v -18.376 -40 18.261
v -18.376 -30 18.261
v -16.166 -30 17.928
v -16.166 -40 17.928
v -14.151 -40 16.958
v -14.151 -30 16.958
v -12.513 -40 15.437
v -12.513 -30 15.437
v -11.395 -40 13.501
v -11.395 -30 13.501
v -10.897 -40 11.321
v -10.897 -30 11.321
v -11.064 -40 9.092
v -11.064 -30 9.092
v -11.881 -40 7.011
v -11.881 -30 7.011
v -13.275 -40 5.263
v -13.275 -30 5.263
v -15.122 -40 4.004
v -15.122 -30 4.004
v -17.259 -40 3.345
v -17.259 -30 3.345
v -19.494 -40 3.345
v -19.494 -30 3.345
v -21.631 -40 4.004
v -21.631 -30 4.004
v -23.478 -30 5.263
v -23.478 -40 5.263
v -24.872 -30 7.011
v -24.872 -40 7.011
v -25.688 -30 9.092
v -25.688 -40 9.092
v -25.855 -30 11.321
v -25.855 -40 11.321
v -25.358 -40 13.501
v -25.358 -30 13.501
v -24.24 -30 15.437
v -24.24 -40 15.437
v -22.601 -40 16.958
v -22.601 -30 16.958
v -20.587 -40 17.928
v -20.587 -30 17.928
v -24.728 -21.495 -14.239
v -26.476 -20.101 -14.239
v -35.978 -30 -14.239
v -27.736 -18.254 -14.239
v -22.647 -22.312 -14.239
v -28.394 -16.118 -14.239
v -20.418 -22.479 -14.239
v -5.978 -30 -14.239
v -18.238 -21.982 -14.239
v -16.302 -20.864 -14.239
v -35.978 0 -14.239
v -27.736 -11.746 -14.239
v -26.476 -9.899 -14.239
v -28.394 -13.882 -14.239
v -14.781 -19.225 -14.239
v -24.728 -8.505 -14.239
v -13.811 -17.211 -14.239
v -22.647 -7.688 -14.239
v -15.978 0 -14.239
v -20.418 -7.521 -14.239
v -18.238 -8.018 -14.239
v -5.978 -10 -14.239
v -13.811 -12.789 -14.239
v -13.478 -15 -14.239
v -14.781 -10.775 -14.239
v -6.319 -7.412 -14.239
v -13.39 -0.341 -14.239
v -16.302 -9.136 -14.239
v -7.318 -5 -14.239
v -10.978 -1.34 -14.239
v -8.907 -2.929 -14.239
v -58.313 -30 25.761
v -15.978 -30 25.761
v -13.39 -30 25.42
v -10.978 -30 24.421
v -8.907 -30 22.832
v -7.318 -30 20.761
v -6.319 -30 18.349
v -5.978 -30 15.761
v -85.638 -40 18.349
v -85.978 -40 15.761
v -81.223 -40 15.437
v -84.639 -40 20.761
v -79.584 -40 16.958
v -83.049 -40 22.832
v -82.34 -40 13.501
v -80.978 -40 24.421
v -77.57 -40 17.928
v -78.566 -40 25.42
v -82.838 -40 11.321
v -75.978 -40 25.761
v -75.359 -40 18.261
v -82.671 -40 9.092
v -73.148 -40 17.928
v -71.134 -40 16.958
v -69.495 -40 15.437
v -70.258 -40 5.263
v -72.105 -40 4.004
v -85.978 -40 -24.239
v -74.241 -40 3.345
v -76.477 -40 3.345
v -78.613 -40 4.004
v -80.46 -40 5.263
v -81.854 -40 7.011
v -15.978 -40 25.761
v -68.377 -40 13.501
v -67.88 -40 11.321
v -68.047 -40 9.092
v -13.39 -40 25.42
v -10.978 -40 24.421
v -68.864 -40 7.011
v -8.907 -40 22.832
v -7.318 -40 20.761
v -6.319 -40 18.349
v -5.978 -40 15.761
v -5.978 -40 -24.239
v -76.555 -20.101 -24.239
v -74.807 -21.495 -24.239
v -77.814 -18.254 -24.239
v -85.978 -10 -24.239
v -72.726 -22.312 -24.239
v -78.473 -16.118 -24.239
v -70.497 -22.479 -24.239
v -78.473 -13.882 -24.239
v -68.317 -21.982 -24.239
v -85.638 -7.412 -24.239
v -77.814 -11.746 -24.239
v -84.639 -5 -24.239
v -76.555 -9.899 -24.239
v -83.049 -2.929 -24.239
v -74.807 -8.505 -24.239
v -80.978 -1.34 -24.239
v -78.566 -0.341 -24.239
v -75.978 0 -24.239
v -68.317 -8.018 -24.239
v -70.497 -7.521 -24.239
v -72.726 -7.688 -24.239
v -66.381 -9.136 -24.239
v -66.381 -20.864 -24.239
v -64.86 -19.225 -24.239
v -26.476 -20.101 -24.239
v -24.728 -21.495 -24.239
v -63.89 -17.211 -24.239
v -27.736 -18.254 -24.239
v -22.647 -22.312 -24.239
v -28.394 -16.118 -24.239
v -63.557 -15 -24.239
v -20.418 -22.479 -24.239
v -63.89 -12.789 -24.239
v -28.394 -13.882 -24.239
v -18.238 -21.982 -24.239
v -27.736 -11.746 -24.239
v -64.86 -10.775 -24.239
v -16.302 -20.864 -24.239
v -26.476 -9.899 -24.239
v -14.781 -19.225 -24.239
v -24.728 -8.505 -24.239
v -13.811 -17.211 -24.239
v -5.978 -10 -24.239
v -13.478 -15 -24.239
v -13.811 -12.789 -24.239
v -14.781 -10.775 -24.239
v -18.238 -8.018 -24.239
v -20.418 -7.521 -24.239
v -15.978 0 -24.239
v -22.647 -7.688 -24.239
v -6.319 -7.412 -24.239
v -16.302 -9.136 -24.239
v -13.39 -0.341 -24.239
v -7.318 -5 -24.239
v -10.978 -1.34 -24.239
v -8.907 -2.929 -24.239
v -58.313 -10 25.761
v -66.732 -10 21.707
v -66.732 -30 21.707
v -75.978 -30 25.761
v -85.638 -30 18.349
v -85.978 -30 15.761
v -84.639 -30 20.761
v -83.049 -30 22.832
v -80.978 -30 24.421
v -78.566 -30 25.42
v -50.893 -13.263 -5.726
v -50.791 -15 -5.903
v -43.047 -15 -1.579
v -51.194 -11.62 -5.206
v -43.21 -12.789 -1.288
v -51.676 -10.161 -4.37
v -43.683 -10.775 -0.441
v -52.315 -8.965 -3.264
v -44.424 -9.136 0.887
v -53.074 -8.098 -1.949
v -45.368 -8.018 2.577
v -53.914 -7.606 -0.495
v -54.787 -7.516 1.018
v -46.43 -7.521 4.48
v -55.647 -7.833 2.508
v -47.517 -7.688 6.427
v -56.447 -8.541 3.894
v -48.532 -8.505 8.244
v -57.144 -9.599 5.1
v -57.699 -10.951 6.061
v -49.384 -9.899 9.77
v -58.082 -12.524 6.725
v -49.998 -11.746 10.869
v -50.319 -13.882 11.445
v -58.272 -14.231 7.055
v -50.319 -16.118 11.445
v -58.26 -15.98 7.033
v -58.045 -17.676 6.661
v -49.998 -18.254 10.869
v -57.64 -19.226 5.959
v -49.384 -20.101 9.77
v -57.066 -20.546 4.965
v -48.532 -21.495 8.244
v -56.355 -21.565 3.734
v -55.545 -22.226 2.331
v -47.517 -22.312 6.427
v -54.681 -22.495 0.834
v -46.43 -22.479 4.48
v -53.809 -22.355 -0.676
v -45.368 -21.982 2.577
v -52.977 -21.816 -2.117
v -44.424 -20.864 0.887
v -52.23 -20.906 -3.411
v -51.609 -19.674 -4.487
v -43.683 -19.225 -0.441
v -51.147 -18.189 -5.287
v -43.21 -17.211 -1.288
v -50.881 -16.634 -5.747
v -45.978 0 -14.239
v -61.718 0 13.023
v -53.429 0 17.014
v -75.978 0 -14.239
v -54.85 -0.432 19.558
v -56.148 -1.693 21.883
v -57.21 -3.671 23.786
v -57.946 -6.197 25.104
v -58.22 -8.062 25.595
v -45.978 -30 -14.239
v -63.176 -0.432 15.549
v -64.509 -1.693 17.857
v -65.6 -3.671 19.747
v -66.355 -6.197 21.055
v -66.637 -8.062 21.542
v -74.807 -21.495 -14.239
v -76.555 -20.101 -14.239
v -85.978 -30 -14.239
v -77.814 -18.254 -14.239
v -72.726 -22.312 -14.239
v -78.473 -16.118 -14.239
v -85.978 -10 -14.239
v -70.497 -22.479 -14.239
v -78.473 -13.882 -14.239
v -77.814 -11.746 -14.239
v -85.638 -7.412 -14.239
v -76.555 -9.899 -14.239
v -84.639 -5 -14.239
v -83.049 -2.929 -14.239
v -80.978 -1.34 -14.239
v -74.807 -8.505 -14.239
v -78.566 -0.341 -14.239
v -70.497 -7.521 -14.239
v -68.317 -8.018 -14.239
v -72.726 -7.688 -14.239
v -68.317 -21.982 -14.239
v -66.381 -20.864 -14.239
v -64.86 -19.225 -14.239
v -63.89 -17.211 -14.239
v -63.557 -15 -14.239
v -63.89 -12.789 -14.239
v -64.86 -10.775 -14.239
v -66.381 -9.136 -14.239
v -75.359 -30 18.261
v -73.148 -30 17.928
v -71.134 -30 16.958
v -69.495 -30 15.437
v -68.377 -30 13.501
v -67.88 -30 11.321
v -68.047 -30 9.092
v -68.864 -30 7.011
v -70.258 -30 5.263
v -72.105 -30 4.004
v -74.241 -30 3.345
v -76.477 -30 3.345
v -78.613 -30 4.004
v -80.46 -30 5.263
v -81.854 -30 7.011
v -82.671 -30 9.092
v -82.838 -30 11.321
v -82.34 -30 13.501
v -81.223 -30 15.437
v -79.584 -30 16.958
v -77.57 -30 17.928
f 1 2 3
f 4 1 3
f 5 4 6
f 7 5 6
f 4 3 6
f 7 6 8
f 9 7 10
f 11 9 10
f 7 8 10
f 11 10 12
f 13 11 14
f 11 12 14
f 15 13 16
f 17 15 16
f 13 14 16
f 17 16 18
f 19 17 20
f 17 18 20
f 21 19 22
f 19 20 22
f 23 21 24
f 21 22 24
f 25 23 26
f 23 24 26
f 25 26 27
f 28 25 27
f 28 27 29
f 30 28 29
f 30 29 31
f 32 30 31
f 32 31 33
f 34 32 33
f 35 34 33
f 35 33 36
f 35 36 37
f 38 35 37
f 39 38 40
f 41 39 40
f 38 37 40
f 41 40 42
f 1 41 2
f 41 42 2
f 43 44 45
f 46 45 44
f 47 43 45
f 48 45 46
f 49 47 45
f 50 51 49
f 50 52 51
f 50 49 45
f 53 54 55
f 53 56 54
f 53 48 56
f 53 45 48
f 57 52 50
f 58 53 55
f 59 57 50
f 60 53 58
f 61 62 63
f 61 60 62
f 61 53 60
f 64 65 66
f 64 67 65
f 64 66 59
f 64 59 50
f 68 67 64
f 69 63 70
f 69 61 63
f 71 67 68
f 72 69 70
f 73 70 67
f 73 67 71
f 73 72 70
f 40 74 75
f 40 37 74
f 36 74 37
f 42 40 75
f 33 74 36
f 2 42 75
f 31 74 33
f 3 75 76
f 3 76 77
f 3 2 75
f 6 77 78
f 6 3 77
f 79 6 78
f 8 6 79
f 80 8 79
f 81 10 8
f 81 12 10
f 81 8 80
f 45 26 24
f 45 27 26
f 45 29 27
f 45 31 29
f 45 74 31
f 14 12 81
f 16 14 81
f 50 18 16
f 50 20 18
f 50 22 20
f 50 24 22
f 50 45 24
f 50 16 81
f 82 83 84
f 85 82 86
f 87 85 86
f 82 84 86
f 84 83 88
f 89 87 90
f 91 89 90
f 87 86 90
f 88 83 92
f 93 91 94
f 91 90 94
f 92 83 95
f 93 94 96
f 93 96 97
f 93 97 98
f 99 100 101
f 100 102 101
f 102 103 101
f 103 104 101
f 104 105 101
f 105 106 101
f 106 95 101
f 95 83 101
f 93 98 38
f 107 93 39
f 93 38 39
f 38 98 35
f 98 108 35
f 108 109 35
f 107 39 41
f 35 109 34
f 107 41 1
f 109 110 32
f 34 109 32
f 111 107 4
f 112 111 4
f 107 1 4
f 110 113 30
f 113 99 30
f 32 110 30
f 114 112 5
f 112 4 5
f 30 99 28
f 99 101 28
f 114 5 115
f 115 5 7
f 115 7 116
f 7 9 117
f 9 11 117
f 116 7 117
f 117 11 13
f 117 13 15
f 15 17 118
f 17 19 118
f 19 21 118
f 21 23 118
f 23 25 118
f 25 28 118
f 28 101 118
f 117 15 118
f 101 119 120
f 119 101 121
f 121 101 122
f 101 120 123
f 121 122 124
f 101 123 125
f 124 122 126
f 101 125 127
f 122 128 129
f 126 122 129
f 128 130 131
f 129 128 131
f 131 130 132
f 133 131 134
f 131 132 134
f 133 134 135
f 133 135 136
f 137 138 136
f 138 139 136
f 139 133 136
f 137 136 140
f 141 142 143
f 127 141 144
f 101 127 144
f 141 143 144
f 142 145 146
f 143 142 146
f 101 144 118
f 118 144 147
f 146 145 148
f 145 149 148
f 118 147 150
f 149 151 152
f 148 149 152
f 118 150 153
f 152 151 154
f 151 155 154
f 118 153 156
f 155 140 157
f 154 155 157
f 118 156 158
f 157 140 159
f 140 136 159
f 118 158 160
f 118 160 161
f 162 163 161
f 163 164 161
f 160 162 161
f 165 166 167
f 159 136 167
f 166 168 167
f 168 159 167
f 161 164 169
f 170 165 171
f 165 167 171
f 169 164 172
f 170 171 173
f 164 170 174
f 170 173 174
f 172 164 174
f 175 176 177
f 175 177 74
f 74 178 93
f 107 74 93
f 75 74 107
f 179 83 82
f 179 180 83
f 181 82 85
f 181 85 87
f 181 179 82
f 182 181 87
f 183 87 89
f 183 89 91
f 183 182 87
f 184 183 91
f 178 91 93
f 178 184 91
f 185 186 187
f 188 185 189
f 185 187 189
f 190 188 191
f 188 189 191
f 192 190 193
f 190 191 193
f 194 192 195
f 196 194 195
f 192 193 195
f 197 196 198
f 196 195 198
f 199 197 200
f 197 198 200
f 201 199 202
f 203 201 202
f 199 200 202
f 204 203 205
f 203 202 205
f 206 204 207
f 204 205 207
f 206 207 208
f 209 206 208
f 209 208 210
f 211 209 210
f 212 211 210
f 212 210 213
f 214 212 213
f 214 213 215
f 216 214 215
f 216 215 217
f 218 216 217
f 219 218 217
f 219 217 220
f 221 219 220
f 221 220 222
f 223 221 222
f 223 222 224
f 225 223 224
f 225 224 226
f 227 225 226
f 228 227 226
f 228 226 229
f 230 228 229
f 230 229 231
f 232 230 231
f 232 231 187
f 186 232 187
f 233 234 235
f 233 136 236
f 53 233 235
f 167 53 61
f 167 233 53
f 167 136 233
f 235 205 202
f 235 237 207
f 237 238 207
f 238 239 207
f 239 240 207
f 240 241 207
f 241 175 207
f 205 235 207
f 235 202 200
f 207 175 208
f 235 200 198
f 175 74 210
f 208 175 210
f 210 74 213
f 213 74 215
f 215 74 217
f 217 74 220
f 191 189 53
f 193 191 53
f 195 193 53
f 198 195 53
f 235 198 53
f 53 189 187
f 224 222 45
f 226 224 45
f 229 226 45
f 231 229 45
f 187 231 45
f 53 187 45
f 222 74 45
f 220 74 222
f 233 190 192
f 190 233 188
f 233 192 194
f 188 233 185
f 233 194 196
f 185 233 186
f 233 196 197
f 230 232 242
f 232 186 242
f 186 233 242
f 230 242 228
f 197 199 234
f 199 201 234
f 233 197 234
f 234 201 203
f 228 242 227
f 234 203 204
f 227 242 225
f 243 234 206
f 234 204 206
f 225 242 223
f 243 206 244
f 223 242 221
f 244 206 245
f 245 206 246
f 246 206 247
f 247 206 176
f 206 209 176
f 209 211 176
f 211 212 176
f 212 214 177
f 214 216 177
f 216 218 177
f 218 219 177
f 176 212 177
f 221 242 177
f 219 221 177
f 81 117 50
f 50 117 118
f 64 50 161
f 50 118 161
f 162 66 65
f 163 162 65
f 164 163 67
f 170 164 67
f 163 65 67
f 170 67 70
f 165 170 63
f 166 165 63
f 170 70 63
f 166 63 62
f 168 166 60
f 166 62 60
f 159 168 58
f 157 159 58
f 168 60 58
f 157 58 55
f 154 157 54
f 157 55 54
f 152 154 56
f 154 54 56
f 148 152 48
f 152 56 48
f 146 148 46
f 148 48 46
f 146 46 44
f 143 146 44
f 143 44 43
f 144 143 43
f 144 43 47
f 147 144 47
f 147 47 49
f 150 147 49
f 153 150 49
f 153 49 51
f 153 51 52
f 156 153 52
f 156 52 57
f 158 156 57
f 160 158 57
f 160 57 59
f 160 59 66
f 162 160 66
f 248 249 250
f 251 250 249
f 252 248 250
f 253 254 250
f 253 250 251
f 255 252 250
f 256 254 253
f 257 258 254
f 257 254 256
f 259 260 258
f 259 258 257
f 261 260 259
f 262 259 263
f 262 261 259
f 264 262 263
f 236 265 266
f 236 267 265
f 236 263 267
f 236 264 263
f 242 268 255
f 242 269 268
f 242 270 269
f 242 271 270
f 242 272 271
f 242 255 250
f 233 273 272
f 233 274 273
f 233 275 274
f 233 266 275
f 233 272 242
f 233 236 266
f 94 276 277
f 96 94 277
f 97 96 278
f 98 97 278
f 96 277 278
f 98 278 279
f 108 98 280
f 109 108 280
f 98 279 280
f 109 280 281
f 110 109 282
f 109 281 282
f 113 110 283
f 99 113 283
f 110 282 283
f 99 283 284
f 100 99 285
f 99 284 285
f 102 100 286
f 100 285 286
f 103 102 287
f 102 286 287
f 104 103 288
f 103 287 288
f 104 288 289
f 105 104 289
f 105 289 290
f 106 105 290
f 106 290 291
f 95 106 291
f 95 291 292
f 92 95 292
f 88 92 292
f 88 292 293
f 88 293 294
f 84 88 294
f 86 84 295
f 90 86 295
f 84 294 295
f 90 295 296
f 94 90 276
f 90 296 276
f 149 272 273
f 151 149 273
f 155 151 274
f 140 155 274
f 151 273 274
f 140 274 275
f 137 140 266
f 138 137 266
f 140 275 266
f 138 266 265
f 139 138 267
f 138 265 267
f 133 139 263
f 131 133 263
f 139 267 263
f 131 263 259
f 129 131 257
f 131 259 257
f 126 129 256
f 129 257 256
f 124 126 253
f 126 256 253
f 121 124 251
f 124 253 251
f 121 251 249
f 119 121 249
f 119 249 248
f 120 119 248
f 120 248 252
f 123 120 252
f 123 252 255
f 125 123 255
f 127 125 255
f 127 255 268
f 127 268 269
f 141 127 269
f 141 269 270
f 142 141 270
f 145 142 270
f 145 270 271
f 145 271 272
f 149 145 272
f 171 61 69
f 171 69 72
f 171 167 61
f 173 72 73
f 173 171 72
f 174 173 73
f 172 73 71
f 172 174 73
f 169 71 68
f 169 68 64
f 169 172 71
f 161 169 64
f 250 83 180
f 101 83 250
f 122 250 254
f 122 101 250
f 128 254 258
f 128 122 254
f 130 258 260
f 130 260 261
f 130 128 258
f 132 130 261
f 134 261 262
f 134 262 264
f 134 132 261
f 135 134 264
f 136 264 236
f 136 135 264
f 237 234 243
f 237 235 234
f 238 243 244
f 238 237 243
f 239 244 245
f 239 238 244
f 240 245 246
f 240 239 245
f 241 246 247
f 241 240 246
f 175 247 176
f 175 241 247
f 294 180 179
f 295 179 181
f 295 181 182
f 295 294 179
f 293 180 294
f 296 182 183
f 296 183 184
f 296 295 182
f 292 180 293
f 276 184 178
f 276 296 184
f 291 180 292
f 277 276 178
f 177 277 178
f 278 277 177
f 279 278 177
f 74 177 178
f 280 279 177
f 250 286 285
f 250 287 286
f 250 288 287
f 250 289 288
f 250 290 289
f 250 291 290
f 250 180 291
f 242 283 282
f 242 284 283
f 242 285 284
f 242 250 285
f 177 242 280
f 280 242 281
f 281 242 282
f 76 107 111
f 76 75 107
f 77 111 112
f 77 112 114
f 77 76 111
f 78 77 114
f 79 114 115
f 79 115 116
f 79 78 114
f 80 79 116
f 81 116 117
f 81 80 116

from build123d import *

# Parameters (mm, degrees)
SKETCH1_W           = 80
SKETCH1_H           = 10
BOSS_EXTRUDE1_DEPTH = 40
SKETCH3_W           = 80
SKETCH3_H           = 10
BOSS_EXTRUDE2_DEPTH = 40
BOSS_EXTRUDE6_DEPTH = 30
SKETCH8_R           = 7.5
CUT_EXTRUDE1_DEPTH  = 10
SKETCH9_R           = 7.5
CUT_EXTRUDE2_DEPTH  = 30
FILLET1_R           = 10
SKETCH10_R          = 7.5
CUT_EXTRUDE3_DEPTH  = 12


with BuildPart() as part:
    # Sketch1 → Boss-Extrude1 (new body)
    with BuildSketch(Plane(origin=(0, 0, 0), x_dir=(1, 0, 0), z_dir=(0, 1, 0))):
        with Locations((-45.97826087, 19.239130435)):
            Rectangle(SKETCH1_W, SKETCH1_H)
    extrude(amount=-BOSS_EXTRUDE1_DEPTH)

    # Sketch3 → Boss-Extrude2 (add)
    with BuildSketch(Plane.XY.offset(-14.239130435)):
        with Locations((-45.97826087, -35)):
            Rectangle(SKETCH3_W, SKETCH3_H)
    extrude(amount=BOSS_EXTRUDE2_DEPTH)

    # Sketch7 → Boss-Extrude6 (add)
    with BuildSketch(Plane(origin=(0, -30, 0), x_dir=(1, 0, 0), z_dir=(0, 1, 0))):
        Polygon((-35.97826087, 14.239130435), (-45.97826087, 14.239130435), (-66.731833313, -21.707111476), (-58.312851229, -25.760869565), align=None)
    extrude(amount=BOSS_EXTRUDE6_DEPTH)

    # Sketch8 → Cut-Extrude1 (cut)
    with BuildSketch(Plane(origin=(0, -30, 0), x_dir=(1, 0, 0), z_dir=(0, 1, 0))):
        with Locations(Location((-18.3763958, -10.760869565, 0), (0, 0, 270))):
            Circle(SKETCH8_R)
        with Locations(Location((-75.358914669, -10.760869565, 0), (0, 0, 270))):
            Circle(SKETCH8_R)
    extrude(amount=-CUT_EXTRUDE1_DEPTH, mode=Mode.SUBTRACT)

    # Sketch9 → Cut-Extrude2 (cut)
    with BuildSketch(Plane.XY.offset(-14.239130435)):
        with Locations((-20.97826087, -15)):
            Circle(SKETCH9_R)
        with Locations((-71.057215434, -15)):
            Circle(SKETCH9_R)
    extrude(amount=-CUT_EXTRUDE2_DEPTH, mode=Mode.SUBTRACT)

    # Fillet1
    fillet1_edges = [part.edges().sort_by_distance(p)[0] for p in [
        (-5.97826087, -35, 25.760869565),
        (-85.97826087, -35, 25.760869565),
        (-62.522342271, 0, 23.733990521),
        (-85.97826087, 0, -19.239130435),
        (-5.97826087, 0, -19.239130435),
    ]]
    fillet(fillet1_edges, radius=FILLET1_R)

    # Sketch10 → Cut-Extrude3 (cut)
    with BuildSketch(Plane(origin=(-33.488225208, 0, -18.698644797), x_dir=(0.48751608982422123, 0, -0.873114002958664), z_dir=(0.873114002958664, 0, 0.48751608982422123))):
        with Locations((-27.107596885, -15)):
            Circle(SKETCH10_R)
    extrude(amount=-CUT_EXTRUDE3_DEPTH, mode=Mode.SUBTRACT)


solid = part.part
